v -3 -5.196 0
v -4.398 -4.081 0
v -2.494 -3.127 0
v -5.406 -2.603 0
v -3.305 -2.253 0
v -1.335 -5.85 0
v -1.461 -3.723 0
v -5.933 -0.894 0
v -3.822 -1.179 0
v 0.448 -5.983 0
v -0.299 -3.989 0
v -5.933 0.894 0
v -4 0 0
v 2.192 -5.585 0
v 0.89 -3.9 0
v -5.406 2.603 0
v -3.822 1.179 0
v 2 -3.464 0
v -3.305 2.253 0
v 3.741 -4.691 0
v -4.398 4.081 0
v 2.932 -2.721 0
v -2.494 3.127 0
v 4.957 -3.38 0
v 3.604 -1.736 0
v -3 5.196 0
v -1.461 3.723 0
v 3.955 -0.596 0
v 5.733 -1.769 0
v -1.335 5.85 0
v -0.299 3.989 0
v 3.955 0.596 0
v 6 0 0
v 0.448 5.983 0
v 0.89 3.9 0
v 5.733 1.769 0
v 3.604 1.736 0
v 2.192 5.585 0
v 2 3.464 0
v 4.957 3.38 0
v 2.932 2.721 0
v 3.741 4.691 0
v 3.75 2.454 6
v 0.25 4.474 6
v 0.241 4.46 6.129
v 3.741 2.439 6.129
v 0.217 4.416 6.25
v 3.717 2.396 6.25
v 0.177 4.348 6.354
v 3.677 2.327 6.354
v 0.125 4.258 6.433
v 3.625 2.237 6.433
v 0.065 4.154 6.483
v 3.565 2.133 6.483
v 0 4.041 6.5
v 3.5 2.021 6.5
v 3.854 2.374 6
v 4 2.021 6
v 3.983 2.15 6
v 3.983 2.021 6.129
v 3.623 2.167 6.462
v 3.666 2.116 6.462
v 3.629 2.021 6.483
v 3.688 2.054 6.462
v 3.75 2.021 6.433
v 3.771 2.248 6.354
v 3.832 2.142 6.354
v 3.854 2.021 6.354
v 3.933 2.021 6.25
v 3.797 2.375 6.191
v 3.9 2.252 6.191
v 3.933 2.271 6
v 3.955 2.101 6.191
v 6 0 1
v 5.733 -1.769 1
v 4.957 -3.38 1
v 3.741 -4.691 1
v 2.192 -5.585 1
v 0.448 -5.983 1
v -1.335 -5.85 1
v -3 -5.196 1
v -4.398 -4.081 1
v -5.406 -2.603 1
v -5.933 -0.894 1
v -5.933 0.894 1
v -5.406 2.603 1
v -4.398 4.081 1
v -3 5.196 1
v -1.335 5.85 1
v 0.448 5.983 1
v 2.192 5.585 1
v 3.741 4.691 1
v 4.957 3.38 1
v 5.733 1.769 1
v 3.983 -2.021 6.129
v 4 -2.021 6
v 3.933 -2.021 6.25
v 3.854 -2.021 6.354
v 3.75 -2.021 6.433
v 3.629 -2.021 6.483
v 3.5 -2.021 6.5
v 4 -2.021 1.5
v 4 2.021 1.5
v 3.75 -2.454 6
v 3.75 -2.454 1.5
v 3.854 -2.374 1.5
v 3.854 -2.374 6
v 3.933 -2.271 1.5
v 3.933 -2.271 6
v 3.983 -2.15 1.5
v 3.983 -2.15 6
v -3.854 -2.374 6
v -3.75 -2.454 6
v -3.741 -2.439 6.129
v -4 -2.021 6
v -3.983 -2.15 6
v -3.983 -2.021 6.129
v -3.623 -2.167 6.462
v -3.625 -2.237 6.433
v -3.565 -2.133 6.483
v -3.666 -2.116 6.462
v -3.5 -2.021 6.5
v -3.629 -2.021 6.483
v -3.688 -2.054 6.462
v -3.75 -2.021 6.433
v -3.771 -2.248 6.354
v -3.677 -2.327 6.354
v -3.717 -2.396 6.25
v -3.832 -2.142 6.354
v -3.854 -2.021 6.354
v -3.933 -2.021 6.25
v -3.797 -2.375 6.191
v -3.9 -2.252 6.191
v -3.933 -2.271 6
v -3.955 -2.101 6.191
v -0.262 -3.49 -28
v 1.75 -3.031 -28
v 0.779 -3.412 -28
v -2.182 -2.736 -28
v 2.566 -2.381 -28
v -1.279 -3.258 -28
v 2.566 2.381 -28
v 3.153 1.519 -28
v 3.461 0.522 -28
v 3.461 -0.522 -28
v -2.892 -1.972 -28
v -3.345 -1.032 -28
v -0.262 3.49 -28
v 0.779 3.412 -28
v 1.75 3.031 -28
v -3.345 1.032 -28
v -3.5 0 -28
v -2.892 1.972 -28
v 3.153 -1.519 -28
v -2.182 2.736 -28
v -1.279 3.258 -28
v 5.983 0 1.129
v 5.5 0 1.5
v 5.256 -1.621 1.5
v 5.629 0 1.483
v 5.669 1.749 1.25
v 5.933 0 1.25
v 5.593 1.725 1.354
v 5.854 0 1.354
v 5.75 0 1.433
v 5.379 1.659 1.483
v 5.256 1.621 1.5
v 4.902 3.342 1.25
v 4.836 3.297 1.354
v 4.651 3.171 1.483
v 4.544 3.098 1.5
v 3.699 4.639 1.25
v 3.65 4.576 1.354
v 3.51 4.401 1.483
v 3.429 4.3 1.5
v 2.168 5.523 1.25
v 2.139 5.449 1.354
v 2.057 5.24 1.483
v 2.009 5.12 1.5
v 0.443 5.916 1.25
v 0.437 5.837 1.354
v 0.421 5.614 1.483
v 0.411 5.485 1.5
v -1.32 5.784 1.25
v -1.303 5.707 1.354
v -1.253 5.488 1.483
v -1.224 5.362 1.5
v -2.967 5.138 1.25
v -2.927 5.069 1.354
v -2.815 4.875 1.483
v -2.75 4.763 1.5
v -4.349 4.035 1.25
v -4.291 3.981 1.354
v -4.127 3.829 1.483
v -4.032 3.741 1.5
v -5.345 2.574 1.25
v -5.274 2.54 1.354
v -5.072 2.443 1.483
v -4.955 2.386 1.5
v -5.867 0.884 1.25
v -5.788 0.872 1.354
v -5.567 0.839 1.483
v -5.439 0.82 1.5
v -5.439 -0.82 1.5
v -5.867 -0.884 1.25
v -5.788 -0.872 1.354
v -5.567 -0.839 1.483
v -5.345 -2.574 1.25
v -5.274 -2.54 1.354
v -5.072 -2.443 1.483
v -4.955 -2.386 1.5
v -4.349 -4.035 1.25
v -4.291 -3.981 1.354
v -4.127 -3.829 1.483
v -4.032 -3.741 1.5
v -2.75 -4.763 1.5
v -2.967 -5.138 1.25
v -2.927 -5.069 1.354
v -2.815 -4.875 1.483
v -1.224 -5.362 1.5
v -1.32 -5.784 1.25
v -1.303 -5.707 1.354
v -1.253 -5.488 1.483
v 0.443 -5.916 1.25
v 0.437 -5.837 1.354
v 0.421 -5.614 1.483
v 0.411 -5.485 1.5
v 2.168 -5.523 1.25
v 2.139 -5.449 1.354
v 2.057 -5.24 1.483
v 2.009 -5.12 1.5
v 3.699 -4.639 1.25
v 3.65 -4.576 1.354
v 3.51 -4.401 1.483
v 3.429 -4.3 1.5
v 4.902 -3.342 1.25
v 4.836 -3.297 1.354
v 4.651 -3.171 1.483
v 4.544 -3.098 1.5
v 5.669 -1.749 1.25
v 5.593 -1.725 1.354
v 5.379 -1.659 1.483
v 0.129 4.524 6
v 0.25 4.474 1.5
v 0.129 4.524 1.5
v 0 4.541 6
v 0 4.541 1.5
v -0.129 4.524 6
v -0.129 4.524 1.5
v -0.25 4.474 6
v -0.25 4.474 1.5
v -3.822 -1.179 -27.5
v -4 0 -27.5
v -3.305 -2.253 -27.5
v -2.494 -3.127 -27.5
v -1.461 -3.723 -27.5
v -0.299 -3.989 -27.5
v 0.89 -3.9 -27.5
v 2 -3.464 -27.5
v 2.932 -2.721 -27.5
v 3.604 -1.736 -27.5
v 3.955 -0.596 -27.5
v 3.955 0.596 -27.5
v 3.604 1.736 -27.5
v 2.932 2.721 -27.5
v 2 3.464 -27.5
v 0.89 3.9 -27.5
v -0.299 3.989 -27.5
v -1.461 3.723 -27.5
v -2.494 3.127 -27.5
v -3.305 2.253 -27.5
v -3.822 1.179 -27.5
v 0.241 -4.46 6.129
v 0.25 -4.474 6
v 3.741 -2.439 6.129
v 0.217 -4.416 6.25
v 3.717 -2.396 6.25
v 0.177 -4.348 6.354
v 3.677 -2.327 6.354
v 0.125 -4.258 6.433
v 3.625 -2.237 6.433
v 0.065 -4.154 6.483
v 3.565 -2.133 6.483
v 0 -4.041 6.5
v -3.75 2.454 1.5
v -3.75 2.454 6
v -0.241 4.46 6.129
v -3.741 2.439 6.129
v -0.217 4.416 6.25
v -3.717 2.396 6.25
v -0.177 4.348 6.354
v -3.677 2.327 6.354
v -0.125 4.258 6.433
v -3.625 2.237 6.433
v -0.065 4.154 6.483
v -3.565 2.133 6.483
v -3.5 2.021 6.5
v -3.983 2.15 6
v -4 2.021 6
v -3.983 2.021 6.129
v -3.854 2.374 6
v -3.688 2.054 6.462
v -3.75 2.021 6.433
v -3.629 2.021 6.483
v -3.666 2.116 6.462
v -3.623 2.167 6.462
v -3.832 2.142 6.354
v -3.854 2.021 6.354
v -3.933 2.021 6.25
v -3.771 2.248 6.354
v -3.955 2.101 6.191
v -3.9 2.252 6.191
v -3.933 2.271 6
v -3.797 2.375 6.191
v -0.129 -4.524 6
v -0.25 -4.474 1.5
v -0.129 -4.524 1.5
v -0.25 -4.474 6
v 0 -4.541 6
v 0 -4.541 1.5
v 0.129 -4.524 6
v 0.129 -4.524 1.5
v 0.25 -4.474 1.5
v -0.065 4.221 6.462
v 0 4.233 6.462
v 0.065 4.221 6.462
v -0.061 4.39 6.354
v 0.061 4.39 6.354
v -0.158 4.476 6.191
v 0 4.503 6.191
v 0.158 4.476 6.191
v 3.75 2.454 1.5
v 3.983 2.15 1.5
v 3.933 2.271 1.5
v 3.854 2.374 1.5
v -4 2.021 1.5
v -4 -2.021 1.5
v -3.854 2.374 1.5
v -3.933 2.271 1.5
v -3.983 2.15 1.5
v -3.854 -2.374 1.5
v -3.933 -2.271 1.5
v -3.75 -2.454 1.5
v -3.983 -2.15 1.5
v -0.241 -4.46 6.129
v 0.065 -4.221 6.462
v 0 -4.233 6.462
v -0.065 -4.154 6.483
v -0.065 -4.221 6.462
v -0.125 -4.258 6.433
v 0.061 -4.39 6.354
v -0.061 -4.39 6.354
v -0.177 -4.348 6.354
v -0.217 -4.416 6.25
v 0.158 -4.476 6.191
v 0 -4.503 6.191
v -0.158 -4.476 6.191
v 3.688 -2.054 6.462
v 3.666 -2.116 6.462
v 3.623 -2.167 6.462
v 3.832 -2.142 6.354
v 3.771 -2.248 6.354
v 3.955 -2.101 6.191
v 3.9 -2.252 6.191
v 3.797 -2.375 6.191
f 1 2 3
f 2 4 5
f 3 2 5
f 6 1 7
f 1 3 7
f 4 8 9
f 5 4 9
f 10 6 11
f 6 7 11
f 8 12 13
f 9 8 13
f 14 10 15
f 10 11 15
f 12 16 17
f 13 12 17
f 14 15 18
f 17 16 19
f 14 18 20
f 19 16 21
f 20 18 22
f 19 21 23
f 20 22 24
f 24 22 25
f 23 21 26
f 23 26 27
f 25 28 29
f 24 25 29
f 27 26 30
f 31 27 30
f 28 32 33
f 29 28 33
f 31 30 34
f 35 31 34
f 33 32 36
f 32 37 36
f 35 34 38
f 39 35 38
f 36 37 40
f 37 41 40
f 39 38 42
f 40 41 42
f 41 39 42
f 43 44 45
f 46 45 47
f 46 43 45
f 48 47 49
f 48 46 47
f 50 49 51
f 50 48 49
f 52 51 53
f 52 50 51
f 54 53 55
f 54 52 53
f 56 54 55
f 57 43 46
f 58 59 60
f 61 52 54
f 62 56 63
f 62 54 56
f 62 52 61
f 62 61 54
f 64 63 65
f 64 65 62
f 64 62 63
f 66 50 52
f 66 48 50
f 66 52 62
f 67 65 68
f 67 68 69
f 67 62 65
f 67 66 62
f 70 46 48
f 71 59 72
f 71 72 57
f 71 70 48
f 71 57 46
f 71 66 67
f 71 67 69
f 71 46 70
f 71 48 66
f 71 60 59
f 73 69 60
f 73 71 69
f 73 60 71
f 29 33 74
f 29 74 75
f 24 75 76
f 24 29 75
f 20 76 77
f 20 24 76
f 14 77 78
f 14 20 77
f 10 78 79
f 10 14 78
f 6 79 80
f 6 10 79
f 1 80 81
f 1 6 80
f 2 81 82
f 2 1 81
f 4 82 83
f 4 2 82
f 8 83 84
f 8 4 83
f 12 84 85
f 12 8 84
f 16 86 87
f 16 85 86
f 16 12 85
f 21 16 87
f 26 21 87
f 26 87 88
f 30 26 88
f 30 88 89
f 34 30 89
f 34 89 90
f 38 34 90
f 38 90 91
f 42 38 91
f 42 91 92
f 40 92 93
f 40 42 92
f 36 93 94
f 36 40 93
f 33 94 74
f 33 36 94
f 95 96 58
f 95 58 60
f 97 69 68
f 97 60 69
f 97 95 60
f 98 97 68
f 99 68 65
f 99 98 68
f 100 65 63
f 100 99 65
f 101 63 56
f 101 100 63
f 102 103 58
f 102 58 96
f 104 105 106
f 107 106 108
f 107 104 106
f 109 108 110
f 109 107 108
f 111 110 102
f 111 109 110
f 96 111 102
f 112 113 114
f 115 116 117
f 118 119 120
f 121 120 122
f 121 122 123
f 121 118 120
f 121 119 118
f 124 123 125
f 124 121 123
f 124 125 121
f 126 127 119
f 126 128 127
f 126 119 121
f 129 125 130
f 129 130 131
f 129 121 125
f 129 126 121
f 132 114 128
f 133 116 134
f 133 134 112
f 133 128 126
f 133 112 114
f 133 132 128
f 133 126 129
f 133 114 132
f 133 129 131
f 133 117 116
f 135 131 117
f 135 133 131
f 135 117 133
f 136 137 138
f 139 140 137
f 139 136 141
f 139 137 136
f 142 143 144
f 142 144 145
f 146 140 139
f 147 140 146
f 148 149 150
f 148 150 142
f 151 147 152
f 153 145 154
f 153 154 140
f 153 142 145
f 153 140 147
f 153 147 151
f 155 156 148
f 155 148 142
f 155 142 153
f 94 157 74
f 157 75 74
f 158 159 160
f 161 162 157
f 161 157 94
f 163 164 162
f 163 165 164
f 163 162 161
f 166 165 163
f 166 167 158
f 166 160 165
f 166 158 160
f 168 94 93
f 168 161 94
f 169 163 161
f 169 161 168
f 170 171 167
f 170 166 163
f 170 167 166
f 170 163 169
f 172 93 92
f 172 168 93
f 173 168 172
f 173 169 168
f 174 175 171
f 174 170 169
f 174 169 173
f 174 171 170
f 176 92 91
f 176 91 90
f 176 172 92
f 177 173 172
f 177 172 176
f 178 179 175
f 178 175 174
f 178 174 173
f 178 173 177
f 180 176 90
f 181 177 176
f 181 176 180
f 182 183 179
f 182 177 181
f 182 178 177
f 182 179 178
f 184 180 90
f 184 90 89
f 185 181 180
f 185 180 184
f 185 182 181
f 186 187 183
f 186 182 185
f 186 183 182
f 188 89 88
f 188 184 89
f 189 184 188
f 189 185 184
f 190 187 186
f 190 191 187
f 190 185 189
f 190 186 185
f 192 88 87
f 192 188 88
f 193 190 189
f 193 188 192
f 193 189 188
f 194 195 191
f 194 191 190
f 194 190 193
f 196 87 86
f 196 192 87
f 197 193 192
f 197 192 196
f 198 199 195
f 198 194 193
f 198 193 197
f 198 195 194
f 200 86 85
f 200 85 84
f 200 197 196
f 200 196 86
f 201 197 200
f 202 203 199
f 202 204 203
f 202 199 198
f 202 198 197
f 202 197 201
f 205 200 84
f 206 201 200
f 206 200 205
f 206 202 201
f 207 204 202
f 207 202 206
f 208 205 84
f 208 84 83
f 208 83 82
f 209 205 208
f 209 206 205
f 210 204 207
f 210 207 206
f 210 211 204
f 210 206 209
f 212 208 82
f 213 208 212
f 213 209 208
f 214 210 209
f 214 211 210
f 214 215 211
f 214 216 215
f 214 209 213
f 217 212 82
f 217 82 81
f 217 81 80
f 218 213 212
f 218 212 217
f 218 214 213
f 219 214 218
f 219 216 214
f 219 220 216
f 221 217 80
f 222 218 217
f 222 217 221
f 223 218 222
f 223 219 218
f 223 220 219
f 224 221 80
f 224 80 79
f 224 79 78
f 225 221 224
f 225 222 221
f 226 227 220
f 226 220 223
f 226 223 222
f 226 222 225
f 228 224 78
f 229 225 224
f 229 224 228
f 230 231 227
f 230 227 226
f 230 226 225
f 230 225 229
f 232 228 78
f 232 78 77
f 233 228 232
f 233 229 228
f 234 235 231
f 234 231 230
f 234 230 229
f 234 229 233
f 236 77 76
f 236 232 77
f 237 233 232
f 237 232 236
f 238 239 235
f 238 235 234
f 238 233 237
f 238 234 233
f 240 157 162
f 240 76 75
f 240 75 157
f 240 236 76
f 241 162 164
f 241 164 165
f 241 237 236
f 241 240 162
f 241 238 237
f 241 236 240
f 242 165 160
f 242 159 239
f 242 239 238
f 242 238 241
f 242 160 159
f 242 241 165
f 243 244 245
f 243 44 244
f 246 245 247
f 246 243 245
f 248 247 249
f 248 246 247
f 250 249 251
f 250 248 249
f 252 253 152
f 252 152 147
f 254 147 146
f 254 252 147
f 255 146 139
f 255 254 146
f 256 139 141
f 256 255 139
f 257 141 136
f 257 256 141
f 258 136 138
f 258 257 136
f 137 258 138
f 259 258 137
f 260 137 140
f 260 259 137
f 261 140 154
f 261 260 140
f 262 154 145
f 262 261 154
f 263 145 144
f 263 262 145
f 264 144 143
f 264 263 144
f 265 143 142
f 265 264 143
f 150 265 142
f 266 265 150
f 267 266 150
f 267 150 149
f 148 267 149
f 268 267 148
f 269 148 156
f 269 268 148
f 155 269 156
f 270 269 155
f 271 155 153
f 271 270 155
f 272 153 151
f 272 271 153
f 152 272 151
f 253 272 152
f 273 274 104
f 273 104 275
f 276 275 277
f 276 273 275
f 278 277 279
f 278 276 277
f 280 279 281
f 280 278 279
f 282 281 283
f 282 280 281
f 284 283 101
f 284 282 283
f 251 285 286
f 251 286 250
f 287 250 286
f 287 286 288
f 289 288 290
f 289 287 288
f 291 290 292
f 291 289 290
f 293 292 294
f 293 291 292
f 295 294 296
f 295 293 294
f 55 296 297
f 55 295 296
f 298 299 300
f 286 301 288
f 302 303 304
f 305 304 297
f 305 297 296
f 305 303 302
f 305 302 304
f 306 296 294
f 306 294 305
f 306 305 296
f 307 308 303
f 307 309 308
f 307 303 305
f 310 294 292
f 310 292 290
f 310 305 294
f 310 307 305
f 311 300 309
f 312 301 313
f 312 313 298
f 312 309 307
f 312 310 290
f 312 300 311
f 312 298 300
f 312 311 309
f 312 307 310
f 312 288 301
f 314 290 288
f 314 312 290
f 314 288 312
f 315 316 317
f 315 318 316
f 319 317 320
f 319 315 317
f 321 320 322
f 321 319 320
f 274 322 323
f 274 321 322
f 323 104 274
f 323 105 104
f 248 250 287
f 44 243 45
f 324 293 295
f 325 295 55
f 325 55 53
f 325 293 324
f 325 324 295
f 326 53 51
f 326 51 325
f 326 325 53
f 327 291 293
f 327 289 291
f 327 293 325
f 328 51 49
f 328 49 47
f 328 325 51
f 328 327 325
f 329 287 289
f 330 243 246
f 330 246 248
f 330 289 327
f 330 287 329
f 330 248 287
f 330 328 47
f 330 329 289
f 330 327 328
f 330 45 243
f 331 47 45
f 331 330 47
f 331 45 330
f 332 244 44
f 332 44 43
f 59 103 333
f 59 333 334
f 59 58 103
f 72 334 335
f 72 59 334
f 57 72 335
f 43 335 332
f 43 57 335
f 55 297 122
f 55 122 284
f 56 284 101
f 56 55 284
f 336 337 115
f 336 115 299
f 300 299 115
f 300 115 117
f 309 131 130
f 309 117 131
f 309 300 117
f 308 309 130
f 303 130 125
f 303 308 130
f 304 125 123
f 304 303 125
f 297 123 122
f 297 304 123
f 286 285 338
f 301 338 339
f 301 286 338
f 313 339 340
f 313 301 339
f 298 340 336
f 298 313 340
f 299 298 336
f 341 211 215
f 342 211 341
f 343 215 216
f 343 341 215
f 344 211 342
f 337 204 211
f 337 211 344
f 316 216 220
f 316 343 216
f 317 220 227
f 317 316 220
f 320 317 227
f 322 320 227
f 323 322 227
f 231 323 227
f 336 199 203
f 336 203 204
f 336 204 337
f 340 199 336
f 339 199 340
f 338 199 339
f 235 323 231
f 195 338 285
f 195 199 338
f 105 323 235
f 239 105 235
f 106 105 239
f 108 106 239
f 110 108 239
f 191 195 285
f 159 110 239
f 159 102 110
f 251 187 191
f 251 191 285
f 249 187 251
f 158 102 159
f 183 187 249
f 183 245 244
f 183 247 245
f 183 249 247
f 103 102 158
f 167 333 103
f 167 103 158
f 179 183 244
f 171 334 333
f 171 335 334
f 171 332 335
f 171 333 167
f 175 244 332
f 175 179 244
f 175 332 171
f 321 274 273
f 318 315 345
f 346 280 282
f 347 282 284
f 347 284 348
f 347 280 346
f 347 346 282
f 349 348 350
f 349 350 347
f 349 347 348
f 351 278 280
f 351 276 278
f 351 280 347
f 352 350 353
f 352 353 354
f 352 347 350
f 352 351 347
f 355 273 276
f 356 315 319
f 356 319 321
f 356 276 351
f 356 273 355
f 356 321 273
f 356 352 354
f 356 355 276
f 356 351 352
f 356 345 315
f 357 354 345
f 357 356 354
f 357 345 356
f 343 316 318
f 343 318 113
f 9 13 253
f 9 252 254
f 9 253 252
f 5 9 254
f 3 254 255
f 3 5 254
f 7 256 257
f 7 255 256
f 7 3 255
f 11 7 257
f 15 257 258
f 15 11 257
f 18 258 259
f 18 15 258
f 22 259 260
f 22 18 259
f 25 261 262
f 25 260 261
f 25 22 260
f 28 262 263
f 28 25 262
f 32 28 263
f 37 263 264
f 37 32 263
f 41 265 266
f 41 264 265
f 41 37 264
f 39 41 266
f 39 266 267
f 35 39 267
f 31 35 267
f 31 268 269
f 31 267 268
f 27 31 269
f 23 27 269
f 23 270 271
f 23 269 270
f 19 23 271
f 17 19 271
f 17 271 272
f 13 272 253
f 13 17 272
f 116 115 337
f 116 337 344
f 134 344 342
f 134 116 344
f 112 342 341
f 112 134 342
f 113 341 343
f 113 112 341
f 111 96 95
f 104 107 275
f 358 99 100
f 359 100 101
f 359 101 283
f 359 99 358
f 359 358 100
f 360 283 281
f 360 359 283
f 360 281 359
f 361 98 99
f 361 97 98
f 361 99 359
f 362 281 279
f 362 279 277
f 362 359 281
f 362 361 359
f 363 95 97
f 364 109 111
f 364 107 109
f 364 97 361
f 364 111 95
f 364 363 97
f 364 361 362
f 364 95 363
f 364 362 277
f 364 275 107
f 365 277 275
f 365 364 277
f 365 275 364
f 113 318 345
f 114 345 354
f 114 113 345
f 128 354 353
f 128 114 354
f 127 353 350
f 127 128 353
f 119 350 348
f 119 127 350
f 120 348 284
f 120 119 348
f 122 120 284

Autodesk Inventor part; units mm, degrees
ref_plane "YZ Plane" through (0, 0, 0) normal (1, 0, 0) x (0, 1, 0)
ref_plane "XZ Plane" through (0, 0, 0) normal (0, 1, 0) x (-1, 0, 0)
ref_plane "XY Plane" through (0, 0, 0) normal (0, 0, 1) x (1, 0, 0)
sketch "草图1" plane through (0, 0, 0) normal (0, 0, 1) x (1, 0, 0)
  circle A0 centre (0, 0) radius 6
  dimension "d0" = 12
extrude "拉伸1" add sketch "草图1" along normal blind 1.5
sketch "草图2" plane through (0, 0, 1.5) normal (0, 0, 1) x (1, 0, 0)
  line L0 (0, -4.6188) -> (-4, -2.3094)
  line L1 (-4, -2.3094) -> (-4, 2.3094)
  line L2 (-4, 2.3094) -> (0, 4.6188)
  line L3 (0, 4.6188) -> (4, 2.3094)
  line L4 (4, 2.3094) -> (4, -2.3094)
  line L5 (4, -2.3094) -> (0, -4.6188)
  line L6 (0, 0) -> (0, 2.9591)
  dimension "d3" = 8
  dimension "d4" = 2.9591
extrude "拉伸2" add sketch "草图2" along normal blind 5
sketch "草图3" plane through (0, 0, 0) normal (0, 0, -1) x (-1, 0, 0)
  circle A0 centre (0, 0) radius 4
  dimension "d7" = 8
extrude "拉伸3" add sketch "草图3" along normal blind 28
thread "螺纹1" size "M8x1.25" class "6g" standard "ANSI Metric M Profile" full length
chamfer "倒角1" distance 0.5 angle 45 1 edges at (4, 0, -28)
fillet "圆角1" radius 0.5 13 edges at (-6, 0, 1.5) (4, 0, 6.5) (2, 3.4641, 6.5) (-2, 3.4641, 6.5) (-4, 0, 6.5) (-2, -3.4641, 6.5) (2, -3.4641, 6.5) (4, 2.3094, 4) (0, 4.6188, 4) (4, -2.3094, 4) (0, -4.6188, 4) (-4, -2.3094, 4) (-4, 2.3094, 4)
properties part number "装填斗固定螺丝"
